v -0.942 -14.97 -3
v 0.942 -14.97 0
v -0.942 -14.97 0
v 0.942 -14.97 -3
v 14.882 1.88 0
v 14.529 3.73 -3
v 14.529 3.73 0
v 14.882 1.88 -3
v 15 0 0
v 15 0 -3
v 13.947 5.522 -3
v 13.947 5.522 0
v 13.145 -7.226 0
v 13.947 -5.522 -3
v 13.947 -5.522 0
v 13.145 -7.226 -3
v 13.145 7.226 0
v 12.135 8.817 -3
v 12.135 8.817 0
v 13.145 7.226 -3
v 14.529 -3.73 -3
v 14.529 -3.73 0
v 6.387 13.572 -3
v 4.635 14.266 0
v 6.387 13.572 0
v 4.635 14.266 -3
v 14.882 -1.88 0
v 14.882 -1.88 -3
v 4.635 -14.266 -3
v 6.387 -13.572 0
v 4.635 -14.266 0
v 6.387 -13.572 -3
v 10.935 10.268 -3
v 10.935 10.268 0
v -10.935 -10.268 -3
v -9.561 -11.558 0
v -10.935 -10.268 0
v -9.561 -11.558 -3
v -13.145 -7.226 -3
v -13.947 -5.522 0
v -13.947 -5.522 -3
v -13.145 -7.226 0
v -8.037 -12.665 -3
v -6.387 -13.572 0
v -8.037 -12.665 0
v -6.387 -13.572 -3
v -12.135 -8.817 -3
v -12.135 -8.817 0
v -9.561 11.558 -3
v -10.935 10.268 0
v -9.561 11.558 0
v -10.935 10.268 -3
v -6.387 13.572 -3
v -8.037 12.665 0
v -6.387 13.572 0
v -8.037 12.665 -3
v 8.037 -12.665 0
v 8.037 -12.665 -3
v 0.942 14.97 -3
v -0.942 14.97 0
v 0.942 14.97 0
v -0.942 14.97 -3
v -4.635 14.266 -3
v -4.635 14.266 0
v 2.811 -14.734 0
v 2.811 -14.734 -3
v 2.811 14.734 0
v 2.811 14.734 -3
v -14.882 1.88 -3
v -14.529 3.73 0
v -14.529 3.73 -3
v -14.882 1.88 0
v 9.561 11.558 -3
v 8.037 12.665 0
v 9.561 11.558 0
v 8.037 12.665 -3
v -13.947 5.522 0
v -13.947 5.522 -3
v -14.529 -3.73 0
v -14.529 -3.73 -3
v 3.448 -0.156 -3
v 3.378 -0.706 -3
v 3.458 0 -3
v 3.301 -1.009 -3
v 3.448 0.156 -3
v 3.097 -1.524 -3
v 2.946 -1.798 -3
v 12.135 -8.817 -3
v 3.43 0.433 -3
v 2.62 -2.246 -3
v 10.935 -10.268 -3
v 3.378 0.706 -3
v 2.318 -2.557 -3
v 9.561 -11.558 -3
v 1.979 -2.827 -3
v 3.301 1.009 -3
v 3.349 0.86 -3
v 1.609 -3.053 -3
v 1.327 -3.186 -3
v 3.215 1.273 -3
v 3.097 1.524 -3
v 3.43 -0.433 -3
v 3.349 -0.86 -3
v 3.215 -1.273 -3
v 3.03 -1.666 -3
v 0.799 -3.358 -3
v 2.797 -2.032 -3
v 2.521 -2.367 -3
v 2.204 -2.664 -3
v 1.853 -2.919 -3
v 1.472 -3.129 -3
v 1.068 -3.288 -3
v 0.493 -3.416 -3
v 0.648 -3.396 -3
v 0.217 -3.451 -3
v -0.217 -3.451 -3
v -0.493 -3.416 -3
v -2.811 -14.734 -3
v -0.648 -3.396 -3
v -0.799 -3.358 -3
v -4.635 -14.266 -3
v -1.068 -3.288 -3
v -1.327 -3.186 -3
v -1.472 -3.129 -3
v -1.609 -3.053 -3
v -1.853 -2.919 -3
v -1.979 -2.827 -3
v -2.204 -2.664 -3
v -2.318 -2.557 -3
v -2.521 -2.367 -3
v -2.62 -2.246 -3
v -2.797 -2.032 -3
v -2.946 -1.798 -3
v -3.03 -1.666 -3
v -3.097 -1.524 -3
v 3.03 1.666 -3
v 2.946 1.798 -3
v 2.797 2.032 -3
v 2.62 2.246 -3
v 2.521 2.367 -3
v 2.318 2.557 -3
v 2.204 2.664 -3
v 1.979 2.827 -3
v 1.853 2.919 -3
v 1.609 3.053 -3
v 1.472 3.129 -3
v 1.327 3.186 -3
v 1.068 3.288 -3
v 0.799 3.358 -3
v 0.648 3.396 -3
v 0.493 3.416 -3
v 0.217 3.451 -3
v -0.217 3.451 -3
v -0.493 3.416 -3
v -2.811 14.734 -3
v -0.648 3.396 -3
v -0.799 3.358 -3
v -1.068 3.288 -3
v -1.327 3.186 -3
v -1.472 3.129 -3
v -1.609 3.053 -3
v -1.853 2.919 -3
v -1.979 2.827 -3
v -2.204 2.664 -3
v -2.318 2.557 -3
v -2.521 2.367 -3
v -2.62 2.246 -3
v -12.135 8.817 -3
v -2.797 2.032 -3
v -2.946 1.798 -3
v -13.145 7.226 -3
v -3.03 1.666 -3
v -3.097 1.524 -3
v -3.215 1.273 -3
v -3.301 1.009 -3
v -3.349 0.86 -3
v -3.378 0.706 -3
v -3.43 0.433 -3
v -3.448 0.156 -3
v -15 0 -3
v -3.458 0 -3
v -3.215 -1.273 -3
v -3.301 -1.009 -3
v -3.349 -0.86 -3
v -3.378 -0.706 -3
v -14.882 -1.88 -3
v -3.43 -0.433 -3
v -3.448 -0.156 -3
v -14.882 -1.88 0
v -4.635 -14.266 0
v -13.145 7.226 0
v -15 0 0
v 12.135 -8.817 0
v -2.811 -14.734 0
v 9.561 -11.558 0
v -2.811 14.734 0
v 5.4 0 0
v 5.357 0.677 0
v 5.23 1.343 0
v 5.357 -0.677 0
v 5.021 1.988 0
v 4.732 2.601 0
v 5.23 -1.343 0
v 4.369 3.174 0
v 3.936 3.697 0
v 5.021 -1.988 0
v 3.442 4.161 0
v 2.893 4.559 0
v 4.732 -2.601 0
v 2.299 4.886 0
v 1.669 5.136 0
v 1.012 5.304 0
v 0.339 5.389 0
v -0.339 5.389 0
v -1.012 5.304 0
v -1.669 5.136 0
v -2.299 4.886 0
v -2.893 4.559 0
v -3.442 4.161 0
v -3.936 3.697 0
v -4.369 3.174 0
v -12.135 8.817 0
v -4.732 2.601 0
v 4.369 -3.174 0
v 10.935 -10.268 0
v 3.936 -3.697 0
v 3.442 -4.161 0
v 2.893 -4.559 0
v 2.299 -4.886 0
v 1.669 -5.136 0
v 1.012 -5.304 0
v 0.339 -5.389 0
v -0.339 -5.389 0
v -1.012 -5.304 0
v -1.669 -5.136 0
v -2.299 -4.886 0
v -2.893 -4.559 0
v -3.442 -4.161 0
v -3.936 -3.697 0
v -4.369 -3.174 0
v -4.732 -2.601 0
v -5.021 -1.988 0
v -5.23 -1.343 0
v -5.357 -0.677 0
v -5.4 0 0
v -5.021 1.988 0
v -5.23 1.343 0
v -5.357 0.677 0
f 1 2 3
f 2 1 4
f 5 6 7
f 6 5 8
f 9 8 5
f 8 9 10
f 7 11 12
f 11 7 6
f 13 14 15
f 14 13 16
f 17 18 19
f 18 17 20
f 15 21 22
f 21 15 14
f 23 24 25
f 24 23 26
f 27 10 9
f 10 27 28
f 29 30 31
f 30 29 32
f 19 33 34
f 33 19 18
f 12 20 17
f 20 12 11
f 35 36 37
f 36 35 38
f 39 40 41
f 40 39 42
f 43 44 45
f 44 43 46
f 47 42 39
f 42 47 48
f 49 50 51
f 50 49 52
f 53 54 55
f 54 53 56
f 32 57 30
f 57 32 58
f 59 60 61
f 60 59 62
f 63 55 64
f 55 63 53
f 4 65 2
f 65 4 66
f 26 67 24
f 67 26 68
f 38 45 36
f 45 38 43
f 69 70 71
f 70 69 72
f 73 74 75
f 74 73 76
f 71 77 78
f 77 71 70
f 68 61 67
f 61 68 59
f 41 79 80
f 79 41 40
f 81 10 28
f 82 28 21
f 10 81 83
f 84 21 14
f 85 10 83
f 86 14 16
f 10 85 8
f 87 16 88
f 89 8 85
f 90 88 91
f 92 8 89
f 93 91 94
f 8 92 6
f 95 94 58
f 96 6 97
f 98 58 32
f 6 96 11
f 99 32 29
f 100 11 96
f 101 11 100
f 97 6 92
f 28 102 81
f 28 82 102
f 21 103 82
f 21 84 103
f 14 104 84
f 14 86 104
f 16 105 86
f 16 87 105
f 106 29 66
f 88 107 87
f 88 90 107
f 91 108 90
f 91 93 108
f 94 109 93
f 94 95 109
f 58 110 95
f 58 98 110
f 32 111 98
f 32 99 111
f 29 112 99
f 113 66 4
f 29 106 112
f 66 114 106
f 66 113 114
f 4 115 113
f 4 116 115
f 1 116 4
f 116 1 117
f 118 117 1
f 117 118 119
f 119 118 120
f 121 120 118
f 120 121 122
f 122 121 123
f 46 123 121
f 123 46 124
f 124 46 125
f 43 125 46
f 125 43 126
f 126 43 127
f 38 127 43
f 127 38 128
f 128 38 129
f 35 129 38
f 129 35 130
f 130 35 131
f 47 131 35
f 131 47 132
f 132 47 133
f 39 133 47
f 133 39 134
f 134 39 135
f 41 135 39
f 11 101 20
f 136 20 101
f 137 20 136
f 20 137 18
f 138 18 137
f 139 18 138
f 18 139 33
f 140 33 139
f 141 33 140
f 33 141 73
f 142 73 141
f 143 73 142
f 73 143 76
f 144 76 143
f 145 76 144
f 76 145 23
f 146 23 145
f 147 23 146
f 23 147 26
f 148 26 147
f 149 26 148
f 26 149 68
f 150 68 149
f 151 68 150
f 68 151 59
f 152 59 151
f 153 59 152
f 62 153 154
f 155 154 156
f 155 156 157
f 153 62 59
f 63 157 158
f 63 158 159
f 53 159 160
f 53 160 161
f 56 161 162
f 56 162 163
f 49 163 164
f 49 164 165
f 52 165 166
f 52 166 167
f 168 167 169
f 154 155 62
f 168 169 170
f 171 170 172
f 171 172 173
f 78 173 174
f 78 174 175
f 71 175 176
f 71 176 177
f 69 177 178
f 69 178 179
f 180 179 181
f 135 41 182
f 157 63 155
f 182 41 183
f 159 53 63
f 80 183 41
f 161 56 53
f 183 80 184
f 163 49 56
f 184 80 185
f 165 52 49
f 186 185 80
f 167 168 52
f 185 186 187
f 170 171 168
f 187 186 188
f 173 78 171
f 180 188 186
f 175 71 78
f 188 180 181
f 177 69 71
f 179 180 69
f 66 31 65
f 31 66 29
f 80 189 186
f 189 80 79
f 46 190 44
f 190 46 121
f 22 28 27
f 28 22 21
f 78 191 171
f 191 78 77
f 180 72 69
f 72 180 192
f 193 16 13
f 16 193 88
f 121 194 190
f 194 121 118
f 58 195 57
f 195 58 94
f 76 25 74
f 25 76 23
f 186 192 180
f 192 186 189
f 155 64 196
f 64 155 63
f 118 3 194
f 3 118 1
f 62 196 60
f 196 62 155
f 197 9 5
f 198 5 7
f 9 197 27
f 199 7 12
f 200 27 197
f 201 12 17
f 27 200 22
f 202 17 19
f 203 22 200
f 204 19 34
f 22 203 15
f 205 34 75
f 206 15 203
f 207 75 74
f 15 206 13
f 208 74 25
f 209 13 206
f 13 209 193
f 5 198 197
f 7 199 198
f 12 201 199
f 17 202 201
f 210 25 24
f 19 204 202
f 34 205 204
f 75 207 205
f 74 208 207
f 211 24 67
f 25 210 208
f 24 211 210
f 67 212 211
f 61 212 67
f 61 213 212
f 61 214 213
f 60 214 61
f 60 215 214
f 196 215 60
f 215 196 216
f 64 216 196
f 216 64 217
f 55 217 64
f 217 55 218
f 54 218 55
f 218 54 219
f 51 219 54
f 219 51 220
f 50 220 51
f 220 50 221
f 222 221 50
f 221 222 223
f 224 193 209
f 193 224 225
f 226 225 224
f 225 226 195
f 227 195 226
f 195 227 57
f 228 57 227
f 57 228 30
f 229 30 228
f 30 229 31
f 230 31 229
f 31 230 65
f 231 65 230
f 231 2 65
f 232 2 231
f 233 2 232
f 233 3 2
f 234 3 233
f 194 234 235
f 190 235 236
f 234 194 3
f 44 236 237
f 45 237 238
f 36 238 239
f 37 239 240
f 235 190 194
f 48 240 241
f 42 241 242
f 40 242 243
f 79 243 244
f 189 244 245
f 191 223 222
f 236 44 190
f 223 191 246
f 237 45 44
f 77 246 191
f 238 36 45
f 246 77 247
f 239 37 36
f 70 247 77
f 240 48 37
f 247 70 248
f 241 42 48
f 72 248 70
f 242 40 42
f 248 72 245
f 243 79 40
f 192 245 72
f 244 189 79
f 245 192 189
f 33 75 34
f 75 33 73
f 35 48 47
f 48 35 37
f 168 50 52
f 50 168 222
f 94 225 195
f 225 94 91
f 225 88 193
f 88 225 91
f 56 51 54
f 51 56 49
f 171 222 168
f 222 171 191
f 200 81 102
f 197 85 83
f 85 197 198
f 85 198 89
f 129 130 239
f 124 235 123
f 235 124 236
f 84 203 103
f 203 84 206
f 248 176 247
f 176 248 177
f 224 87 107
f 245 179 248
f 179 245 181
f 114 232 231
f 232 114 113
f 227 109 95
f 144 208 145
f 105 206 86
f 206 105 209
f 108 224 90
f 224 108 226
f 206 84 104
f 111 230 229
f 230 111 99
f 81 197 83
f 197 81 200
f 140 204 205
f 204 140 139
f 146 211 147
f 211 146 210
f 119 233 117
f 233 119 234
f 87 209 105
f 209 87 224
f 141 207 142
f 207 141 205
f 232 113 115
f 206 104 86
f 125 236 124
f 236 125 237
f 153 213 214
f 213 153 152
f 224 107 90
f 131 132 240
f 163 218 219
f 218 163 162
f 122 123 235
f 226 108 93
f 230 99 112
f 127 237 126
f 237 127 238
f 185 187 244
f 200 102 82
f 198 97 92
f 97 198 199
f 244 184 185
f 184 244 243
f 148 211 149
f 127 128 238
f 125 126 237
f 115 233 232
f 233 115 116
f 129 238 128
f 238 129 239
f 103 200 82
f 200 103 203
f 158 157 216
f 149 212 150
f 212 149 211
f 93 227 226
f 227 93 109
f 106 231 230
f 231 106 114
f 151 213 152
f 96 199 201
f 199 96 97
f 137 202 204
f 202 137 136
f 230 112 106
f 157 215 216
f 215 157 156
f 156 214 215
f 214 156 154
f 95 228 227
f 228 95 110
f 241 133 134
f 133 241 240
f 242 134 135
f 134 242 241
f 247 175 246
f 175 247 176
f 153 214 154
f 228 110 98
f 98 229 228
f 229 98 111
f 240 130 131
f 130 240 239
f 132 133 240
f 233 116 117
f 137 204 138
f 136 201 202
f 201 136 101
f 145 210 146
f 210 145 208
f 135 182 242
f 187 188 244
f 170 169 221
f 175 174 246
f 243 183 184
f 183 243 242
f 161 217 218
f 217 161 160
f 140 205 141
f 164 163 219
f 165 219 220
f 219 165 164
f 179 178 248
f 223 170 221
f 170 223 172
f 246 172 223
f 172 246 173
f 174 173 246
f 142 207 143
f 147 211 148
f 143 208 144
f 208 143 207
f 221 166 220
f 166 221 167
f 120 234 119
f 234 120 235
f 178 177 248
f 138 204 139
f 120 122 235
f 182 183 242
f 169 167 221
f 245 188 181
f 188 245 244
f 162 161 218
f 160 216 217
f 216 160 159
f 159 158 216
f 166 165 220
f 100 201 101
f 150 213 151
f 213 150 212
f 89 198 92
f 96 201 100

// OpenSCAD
$fn = 50;

difference() {
	union() {
		translate(v = [0, 0, -3.0]) {
			cylinder(h = 3, r = 15.0);
		}
		#translate(v = [0, 0, -6.0]) {
			cylinder(h = 6, r = 2.875);
		}
	}
	union() {
		translate(v = [0, 0, 0]) {
			rotate(a = [0, 0, 0]) {
				difference() {
					union() {
						translate(v = [0, 0, -6.0]) {
							cylinder(h = 6, r = 2.6);
						}
						translate(v = [0, 0, -3.9]) {
							cylinder(h = 3.9, r1 = 2.875, r2 = 5.4);
						}
						translate(v = [0, 0, -6.0]) {
							cylinder(h = 6, r = 2.875);
						}
						translate(v = [0, 0, -6.0]) {
							cylinder(h = 6, r = 2.6);
						}
					}
					union();
				}
			}
		}
	}
}
